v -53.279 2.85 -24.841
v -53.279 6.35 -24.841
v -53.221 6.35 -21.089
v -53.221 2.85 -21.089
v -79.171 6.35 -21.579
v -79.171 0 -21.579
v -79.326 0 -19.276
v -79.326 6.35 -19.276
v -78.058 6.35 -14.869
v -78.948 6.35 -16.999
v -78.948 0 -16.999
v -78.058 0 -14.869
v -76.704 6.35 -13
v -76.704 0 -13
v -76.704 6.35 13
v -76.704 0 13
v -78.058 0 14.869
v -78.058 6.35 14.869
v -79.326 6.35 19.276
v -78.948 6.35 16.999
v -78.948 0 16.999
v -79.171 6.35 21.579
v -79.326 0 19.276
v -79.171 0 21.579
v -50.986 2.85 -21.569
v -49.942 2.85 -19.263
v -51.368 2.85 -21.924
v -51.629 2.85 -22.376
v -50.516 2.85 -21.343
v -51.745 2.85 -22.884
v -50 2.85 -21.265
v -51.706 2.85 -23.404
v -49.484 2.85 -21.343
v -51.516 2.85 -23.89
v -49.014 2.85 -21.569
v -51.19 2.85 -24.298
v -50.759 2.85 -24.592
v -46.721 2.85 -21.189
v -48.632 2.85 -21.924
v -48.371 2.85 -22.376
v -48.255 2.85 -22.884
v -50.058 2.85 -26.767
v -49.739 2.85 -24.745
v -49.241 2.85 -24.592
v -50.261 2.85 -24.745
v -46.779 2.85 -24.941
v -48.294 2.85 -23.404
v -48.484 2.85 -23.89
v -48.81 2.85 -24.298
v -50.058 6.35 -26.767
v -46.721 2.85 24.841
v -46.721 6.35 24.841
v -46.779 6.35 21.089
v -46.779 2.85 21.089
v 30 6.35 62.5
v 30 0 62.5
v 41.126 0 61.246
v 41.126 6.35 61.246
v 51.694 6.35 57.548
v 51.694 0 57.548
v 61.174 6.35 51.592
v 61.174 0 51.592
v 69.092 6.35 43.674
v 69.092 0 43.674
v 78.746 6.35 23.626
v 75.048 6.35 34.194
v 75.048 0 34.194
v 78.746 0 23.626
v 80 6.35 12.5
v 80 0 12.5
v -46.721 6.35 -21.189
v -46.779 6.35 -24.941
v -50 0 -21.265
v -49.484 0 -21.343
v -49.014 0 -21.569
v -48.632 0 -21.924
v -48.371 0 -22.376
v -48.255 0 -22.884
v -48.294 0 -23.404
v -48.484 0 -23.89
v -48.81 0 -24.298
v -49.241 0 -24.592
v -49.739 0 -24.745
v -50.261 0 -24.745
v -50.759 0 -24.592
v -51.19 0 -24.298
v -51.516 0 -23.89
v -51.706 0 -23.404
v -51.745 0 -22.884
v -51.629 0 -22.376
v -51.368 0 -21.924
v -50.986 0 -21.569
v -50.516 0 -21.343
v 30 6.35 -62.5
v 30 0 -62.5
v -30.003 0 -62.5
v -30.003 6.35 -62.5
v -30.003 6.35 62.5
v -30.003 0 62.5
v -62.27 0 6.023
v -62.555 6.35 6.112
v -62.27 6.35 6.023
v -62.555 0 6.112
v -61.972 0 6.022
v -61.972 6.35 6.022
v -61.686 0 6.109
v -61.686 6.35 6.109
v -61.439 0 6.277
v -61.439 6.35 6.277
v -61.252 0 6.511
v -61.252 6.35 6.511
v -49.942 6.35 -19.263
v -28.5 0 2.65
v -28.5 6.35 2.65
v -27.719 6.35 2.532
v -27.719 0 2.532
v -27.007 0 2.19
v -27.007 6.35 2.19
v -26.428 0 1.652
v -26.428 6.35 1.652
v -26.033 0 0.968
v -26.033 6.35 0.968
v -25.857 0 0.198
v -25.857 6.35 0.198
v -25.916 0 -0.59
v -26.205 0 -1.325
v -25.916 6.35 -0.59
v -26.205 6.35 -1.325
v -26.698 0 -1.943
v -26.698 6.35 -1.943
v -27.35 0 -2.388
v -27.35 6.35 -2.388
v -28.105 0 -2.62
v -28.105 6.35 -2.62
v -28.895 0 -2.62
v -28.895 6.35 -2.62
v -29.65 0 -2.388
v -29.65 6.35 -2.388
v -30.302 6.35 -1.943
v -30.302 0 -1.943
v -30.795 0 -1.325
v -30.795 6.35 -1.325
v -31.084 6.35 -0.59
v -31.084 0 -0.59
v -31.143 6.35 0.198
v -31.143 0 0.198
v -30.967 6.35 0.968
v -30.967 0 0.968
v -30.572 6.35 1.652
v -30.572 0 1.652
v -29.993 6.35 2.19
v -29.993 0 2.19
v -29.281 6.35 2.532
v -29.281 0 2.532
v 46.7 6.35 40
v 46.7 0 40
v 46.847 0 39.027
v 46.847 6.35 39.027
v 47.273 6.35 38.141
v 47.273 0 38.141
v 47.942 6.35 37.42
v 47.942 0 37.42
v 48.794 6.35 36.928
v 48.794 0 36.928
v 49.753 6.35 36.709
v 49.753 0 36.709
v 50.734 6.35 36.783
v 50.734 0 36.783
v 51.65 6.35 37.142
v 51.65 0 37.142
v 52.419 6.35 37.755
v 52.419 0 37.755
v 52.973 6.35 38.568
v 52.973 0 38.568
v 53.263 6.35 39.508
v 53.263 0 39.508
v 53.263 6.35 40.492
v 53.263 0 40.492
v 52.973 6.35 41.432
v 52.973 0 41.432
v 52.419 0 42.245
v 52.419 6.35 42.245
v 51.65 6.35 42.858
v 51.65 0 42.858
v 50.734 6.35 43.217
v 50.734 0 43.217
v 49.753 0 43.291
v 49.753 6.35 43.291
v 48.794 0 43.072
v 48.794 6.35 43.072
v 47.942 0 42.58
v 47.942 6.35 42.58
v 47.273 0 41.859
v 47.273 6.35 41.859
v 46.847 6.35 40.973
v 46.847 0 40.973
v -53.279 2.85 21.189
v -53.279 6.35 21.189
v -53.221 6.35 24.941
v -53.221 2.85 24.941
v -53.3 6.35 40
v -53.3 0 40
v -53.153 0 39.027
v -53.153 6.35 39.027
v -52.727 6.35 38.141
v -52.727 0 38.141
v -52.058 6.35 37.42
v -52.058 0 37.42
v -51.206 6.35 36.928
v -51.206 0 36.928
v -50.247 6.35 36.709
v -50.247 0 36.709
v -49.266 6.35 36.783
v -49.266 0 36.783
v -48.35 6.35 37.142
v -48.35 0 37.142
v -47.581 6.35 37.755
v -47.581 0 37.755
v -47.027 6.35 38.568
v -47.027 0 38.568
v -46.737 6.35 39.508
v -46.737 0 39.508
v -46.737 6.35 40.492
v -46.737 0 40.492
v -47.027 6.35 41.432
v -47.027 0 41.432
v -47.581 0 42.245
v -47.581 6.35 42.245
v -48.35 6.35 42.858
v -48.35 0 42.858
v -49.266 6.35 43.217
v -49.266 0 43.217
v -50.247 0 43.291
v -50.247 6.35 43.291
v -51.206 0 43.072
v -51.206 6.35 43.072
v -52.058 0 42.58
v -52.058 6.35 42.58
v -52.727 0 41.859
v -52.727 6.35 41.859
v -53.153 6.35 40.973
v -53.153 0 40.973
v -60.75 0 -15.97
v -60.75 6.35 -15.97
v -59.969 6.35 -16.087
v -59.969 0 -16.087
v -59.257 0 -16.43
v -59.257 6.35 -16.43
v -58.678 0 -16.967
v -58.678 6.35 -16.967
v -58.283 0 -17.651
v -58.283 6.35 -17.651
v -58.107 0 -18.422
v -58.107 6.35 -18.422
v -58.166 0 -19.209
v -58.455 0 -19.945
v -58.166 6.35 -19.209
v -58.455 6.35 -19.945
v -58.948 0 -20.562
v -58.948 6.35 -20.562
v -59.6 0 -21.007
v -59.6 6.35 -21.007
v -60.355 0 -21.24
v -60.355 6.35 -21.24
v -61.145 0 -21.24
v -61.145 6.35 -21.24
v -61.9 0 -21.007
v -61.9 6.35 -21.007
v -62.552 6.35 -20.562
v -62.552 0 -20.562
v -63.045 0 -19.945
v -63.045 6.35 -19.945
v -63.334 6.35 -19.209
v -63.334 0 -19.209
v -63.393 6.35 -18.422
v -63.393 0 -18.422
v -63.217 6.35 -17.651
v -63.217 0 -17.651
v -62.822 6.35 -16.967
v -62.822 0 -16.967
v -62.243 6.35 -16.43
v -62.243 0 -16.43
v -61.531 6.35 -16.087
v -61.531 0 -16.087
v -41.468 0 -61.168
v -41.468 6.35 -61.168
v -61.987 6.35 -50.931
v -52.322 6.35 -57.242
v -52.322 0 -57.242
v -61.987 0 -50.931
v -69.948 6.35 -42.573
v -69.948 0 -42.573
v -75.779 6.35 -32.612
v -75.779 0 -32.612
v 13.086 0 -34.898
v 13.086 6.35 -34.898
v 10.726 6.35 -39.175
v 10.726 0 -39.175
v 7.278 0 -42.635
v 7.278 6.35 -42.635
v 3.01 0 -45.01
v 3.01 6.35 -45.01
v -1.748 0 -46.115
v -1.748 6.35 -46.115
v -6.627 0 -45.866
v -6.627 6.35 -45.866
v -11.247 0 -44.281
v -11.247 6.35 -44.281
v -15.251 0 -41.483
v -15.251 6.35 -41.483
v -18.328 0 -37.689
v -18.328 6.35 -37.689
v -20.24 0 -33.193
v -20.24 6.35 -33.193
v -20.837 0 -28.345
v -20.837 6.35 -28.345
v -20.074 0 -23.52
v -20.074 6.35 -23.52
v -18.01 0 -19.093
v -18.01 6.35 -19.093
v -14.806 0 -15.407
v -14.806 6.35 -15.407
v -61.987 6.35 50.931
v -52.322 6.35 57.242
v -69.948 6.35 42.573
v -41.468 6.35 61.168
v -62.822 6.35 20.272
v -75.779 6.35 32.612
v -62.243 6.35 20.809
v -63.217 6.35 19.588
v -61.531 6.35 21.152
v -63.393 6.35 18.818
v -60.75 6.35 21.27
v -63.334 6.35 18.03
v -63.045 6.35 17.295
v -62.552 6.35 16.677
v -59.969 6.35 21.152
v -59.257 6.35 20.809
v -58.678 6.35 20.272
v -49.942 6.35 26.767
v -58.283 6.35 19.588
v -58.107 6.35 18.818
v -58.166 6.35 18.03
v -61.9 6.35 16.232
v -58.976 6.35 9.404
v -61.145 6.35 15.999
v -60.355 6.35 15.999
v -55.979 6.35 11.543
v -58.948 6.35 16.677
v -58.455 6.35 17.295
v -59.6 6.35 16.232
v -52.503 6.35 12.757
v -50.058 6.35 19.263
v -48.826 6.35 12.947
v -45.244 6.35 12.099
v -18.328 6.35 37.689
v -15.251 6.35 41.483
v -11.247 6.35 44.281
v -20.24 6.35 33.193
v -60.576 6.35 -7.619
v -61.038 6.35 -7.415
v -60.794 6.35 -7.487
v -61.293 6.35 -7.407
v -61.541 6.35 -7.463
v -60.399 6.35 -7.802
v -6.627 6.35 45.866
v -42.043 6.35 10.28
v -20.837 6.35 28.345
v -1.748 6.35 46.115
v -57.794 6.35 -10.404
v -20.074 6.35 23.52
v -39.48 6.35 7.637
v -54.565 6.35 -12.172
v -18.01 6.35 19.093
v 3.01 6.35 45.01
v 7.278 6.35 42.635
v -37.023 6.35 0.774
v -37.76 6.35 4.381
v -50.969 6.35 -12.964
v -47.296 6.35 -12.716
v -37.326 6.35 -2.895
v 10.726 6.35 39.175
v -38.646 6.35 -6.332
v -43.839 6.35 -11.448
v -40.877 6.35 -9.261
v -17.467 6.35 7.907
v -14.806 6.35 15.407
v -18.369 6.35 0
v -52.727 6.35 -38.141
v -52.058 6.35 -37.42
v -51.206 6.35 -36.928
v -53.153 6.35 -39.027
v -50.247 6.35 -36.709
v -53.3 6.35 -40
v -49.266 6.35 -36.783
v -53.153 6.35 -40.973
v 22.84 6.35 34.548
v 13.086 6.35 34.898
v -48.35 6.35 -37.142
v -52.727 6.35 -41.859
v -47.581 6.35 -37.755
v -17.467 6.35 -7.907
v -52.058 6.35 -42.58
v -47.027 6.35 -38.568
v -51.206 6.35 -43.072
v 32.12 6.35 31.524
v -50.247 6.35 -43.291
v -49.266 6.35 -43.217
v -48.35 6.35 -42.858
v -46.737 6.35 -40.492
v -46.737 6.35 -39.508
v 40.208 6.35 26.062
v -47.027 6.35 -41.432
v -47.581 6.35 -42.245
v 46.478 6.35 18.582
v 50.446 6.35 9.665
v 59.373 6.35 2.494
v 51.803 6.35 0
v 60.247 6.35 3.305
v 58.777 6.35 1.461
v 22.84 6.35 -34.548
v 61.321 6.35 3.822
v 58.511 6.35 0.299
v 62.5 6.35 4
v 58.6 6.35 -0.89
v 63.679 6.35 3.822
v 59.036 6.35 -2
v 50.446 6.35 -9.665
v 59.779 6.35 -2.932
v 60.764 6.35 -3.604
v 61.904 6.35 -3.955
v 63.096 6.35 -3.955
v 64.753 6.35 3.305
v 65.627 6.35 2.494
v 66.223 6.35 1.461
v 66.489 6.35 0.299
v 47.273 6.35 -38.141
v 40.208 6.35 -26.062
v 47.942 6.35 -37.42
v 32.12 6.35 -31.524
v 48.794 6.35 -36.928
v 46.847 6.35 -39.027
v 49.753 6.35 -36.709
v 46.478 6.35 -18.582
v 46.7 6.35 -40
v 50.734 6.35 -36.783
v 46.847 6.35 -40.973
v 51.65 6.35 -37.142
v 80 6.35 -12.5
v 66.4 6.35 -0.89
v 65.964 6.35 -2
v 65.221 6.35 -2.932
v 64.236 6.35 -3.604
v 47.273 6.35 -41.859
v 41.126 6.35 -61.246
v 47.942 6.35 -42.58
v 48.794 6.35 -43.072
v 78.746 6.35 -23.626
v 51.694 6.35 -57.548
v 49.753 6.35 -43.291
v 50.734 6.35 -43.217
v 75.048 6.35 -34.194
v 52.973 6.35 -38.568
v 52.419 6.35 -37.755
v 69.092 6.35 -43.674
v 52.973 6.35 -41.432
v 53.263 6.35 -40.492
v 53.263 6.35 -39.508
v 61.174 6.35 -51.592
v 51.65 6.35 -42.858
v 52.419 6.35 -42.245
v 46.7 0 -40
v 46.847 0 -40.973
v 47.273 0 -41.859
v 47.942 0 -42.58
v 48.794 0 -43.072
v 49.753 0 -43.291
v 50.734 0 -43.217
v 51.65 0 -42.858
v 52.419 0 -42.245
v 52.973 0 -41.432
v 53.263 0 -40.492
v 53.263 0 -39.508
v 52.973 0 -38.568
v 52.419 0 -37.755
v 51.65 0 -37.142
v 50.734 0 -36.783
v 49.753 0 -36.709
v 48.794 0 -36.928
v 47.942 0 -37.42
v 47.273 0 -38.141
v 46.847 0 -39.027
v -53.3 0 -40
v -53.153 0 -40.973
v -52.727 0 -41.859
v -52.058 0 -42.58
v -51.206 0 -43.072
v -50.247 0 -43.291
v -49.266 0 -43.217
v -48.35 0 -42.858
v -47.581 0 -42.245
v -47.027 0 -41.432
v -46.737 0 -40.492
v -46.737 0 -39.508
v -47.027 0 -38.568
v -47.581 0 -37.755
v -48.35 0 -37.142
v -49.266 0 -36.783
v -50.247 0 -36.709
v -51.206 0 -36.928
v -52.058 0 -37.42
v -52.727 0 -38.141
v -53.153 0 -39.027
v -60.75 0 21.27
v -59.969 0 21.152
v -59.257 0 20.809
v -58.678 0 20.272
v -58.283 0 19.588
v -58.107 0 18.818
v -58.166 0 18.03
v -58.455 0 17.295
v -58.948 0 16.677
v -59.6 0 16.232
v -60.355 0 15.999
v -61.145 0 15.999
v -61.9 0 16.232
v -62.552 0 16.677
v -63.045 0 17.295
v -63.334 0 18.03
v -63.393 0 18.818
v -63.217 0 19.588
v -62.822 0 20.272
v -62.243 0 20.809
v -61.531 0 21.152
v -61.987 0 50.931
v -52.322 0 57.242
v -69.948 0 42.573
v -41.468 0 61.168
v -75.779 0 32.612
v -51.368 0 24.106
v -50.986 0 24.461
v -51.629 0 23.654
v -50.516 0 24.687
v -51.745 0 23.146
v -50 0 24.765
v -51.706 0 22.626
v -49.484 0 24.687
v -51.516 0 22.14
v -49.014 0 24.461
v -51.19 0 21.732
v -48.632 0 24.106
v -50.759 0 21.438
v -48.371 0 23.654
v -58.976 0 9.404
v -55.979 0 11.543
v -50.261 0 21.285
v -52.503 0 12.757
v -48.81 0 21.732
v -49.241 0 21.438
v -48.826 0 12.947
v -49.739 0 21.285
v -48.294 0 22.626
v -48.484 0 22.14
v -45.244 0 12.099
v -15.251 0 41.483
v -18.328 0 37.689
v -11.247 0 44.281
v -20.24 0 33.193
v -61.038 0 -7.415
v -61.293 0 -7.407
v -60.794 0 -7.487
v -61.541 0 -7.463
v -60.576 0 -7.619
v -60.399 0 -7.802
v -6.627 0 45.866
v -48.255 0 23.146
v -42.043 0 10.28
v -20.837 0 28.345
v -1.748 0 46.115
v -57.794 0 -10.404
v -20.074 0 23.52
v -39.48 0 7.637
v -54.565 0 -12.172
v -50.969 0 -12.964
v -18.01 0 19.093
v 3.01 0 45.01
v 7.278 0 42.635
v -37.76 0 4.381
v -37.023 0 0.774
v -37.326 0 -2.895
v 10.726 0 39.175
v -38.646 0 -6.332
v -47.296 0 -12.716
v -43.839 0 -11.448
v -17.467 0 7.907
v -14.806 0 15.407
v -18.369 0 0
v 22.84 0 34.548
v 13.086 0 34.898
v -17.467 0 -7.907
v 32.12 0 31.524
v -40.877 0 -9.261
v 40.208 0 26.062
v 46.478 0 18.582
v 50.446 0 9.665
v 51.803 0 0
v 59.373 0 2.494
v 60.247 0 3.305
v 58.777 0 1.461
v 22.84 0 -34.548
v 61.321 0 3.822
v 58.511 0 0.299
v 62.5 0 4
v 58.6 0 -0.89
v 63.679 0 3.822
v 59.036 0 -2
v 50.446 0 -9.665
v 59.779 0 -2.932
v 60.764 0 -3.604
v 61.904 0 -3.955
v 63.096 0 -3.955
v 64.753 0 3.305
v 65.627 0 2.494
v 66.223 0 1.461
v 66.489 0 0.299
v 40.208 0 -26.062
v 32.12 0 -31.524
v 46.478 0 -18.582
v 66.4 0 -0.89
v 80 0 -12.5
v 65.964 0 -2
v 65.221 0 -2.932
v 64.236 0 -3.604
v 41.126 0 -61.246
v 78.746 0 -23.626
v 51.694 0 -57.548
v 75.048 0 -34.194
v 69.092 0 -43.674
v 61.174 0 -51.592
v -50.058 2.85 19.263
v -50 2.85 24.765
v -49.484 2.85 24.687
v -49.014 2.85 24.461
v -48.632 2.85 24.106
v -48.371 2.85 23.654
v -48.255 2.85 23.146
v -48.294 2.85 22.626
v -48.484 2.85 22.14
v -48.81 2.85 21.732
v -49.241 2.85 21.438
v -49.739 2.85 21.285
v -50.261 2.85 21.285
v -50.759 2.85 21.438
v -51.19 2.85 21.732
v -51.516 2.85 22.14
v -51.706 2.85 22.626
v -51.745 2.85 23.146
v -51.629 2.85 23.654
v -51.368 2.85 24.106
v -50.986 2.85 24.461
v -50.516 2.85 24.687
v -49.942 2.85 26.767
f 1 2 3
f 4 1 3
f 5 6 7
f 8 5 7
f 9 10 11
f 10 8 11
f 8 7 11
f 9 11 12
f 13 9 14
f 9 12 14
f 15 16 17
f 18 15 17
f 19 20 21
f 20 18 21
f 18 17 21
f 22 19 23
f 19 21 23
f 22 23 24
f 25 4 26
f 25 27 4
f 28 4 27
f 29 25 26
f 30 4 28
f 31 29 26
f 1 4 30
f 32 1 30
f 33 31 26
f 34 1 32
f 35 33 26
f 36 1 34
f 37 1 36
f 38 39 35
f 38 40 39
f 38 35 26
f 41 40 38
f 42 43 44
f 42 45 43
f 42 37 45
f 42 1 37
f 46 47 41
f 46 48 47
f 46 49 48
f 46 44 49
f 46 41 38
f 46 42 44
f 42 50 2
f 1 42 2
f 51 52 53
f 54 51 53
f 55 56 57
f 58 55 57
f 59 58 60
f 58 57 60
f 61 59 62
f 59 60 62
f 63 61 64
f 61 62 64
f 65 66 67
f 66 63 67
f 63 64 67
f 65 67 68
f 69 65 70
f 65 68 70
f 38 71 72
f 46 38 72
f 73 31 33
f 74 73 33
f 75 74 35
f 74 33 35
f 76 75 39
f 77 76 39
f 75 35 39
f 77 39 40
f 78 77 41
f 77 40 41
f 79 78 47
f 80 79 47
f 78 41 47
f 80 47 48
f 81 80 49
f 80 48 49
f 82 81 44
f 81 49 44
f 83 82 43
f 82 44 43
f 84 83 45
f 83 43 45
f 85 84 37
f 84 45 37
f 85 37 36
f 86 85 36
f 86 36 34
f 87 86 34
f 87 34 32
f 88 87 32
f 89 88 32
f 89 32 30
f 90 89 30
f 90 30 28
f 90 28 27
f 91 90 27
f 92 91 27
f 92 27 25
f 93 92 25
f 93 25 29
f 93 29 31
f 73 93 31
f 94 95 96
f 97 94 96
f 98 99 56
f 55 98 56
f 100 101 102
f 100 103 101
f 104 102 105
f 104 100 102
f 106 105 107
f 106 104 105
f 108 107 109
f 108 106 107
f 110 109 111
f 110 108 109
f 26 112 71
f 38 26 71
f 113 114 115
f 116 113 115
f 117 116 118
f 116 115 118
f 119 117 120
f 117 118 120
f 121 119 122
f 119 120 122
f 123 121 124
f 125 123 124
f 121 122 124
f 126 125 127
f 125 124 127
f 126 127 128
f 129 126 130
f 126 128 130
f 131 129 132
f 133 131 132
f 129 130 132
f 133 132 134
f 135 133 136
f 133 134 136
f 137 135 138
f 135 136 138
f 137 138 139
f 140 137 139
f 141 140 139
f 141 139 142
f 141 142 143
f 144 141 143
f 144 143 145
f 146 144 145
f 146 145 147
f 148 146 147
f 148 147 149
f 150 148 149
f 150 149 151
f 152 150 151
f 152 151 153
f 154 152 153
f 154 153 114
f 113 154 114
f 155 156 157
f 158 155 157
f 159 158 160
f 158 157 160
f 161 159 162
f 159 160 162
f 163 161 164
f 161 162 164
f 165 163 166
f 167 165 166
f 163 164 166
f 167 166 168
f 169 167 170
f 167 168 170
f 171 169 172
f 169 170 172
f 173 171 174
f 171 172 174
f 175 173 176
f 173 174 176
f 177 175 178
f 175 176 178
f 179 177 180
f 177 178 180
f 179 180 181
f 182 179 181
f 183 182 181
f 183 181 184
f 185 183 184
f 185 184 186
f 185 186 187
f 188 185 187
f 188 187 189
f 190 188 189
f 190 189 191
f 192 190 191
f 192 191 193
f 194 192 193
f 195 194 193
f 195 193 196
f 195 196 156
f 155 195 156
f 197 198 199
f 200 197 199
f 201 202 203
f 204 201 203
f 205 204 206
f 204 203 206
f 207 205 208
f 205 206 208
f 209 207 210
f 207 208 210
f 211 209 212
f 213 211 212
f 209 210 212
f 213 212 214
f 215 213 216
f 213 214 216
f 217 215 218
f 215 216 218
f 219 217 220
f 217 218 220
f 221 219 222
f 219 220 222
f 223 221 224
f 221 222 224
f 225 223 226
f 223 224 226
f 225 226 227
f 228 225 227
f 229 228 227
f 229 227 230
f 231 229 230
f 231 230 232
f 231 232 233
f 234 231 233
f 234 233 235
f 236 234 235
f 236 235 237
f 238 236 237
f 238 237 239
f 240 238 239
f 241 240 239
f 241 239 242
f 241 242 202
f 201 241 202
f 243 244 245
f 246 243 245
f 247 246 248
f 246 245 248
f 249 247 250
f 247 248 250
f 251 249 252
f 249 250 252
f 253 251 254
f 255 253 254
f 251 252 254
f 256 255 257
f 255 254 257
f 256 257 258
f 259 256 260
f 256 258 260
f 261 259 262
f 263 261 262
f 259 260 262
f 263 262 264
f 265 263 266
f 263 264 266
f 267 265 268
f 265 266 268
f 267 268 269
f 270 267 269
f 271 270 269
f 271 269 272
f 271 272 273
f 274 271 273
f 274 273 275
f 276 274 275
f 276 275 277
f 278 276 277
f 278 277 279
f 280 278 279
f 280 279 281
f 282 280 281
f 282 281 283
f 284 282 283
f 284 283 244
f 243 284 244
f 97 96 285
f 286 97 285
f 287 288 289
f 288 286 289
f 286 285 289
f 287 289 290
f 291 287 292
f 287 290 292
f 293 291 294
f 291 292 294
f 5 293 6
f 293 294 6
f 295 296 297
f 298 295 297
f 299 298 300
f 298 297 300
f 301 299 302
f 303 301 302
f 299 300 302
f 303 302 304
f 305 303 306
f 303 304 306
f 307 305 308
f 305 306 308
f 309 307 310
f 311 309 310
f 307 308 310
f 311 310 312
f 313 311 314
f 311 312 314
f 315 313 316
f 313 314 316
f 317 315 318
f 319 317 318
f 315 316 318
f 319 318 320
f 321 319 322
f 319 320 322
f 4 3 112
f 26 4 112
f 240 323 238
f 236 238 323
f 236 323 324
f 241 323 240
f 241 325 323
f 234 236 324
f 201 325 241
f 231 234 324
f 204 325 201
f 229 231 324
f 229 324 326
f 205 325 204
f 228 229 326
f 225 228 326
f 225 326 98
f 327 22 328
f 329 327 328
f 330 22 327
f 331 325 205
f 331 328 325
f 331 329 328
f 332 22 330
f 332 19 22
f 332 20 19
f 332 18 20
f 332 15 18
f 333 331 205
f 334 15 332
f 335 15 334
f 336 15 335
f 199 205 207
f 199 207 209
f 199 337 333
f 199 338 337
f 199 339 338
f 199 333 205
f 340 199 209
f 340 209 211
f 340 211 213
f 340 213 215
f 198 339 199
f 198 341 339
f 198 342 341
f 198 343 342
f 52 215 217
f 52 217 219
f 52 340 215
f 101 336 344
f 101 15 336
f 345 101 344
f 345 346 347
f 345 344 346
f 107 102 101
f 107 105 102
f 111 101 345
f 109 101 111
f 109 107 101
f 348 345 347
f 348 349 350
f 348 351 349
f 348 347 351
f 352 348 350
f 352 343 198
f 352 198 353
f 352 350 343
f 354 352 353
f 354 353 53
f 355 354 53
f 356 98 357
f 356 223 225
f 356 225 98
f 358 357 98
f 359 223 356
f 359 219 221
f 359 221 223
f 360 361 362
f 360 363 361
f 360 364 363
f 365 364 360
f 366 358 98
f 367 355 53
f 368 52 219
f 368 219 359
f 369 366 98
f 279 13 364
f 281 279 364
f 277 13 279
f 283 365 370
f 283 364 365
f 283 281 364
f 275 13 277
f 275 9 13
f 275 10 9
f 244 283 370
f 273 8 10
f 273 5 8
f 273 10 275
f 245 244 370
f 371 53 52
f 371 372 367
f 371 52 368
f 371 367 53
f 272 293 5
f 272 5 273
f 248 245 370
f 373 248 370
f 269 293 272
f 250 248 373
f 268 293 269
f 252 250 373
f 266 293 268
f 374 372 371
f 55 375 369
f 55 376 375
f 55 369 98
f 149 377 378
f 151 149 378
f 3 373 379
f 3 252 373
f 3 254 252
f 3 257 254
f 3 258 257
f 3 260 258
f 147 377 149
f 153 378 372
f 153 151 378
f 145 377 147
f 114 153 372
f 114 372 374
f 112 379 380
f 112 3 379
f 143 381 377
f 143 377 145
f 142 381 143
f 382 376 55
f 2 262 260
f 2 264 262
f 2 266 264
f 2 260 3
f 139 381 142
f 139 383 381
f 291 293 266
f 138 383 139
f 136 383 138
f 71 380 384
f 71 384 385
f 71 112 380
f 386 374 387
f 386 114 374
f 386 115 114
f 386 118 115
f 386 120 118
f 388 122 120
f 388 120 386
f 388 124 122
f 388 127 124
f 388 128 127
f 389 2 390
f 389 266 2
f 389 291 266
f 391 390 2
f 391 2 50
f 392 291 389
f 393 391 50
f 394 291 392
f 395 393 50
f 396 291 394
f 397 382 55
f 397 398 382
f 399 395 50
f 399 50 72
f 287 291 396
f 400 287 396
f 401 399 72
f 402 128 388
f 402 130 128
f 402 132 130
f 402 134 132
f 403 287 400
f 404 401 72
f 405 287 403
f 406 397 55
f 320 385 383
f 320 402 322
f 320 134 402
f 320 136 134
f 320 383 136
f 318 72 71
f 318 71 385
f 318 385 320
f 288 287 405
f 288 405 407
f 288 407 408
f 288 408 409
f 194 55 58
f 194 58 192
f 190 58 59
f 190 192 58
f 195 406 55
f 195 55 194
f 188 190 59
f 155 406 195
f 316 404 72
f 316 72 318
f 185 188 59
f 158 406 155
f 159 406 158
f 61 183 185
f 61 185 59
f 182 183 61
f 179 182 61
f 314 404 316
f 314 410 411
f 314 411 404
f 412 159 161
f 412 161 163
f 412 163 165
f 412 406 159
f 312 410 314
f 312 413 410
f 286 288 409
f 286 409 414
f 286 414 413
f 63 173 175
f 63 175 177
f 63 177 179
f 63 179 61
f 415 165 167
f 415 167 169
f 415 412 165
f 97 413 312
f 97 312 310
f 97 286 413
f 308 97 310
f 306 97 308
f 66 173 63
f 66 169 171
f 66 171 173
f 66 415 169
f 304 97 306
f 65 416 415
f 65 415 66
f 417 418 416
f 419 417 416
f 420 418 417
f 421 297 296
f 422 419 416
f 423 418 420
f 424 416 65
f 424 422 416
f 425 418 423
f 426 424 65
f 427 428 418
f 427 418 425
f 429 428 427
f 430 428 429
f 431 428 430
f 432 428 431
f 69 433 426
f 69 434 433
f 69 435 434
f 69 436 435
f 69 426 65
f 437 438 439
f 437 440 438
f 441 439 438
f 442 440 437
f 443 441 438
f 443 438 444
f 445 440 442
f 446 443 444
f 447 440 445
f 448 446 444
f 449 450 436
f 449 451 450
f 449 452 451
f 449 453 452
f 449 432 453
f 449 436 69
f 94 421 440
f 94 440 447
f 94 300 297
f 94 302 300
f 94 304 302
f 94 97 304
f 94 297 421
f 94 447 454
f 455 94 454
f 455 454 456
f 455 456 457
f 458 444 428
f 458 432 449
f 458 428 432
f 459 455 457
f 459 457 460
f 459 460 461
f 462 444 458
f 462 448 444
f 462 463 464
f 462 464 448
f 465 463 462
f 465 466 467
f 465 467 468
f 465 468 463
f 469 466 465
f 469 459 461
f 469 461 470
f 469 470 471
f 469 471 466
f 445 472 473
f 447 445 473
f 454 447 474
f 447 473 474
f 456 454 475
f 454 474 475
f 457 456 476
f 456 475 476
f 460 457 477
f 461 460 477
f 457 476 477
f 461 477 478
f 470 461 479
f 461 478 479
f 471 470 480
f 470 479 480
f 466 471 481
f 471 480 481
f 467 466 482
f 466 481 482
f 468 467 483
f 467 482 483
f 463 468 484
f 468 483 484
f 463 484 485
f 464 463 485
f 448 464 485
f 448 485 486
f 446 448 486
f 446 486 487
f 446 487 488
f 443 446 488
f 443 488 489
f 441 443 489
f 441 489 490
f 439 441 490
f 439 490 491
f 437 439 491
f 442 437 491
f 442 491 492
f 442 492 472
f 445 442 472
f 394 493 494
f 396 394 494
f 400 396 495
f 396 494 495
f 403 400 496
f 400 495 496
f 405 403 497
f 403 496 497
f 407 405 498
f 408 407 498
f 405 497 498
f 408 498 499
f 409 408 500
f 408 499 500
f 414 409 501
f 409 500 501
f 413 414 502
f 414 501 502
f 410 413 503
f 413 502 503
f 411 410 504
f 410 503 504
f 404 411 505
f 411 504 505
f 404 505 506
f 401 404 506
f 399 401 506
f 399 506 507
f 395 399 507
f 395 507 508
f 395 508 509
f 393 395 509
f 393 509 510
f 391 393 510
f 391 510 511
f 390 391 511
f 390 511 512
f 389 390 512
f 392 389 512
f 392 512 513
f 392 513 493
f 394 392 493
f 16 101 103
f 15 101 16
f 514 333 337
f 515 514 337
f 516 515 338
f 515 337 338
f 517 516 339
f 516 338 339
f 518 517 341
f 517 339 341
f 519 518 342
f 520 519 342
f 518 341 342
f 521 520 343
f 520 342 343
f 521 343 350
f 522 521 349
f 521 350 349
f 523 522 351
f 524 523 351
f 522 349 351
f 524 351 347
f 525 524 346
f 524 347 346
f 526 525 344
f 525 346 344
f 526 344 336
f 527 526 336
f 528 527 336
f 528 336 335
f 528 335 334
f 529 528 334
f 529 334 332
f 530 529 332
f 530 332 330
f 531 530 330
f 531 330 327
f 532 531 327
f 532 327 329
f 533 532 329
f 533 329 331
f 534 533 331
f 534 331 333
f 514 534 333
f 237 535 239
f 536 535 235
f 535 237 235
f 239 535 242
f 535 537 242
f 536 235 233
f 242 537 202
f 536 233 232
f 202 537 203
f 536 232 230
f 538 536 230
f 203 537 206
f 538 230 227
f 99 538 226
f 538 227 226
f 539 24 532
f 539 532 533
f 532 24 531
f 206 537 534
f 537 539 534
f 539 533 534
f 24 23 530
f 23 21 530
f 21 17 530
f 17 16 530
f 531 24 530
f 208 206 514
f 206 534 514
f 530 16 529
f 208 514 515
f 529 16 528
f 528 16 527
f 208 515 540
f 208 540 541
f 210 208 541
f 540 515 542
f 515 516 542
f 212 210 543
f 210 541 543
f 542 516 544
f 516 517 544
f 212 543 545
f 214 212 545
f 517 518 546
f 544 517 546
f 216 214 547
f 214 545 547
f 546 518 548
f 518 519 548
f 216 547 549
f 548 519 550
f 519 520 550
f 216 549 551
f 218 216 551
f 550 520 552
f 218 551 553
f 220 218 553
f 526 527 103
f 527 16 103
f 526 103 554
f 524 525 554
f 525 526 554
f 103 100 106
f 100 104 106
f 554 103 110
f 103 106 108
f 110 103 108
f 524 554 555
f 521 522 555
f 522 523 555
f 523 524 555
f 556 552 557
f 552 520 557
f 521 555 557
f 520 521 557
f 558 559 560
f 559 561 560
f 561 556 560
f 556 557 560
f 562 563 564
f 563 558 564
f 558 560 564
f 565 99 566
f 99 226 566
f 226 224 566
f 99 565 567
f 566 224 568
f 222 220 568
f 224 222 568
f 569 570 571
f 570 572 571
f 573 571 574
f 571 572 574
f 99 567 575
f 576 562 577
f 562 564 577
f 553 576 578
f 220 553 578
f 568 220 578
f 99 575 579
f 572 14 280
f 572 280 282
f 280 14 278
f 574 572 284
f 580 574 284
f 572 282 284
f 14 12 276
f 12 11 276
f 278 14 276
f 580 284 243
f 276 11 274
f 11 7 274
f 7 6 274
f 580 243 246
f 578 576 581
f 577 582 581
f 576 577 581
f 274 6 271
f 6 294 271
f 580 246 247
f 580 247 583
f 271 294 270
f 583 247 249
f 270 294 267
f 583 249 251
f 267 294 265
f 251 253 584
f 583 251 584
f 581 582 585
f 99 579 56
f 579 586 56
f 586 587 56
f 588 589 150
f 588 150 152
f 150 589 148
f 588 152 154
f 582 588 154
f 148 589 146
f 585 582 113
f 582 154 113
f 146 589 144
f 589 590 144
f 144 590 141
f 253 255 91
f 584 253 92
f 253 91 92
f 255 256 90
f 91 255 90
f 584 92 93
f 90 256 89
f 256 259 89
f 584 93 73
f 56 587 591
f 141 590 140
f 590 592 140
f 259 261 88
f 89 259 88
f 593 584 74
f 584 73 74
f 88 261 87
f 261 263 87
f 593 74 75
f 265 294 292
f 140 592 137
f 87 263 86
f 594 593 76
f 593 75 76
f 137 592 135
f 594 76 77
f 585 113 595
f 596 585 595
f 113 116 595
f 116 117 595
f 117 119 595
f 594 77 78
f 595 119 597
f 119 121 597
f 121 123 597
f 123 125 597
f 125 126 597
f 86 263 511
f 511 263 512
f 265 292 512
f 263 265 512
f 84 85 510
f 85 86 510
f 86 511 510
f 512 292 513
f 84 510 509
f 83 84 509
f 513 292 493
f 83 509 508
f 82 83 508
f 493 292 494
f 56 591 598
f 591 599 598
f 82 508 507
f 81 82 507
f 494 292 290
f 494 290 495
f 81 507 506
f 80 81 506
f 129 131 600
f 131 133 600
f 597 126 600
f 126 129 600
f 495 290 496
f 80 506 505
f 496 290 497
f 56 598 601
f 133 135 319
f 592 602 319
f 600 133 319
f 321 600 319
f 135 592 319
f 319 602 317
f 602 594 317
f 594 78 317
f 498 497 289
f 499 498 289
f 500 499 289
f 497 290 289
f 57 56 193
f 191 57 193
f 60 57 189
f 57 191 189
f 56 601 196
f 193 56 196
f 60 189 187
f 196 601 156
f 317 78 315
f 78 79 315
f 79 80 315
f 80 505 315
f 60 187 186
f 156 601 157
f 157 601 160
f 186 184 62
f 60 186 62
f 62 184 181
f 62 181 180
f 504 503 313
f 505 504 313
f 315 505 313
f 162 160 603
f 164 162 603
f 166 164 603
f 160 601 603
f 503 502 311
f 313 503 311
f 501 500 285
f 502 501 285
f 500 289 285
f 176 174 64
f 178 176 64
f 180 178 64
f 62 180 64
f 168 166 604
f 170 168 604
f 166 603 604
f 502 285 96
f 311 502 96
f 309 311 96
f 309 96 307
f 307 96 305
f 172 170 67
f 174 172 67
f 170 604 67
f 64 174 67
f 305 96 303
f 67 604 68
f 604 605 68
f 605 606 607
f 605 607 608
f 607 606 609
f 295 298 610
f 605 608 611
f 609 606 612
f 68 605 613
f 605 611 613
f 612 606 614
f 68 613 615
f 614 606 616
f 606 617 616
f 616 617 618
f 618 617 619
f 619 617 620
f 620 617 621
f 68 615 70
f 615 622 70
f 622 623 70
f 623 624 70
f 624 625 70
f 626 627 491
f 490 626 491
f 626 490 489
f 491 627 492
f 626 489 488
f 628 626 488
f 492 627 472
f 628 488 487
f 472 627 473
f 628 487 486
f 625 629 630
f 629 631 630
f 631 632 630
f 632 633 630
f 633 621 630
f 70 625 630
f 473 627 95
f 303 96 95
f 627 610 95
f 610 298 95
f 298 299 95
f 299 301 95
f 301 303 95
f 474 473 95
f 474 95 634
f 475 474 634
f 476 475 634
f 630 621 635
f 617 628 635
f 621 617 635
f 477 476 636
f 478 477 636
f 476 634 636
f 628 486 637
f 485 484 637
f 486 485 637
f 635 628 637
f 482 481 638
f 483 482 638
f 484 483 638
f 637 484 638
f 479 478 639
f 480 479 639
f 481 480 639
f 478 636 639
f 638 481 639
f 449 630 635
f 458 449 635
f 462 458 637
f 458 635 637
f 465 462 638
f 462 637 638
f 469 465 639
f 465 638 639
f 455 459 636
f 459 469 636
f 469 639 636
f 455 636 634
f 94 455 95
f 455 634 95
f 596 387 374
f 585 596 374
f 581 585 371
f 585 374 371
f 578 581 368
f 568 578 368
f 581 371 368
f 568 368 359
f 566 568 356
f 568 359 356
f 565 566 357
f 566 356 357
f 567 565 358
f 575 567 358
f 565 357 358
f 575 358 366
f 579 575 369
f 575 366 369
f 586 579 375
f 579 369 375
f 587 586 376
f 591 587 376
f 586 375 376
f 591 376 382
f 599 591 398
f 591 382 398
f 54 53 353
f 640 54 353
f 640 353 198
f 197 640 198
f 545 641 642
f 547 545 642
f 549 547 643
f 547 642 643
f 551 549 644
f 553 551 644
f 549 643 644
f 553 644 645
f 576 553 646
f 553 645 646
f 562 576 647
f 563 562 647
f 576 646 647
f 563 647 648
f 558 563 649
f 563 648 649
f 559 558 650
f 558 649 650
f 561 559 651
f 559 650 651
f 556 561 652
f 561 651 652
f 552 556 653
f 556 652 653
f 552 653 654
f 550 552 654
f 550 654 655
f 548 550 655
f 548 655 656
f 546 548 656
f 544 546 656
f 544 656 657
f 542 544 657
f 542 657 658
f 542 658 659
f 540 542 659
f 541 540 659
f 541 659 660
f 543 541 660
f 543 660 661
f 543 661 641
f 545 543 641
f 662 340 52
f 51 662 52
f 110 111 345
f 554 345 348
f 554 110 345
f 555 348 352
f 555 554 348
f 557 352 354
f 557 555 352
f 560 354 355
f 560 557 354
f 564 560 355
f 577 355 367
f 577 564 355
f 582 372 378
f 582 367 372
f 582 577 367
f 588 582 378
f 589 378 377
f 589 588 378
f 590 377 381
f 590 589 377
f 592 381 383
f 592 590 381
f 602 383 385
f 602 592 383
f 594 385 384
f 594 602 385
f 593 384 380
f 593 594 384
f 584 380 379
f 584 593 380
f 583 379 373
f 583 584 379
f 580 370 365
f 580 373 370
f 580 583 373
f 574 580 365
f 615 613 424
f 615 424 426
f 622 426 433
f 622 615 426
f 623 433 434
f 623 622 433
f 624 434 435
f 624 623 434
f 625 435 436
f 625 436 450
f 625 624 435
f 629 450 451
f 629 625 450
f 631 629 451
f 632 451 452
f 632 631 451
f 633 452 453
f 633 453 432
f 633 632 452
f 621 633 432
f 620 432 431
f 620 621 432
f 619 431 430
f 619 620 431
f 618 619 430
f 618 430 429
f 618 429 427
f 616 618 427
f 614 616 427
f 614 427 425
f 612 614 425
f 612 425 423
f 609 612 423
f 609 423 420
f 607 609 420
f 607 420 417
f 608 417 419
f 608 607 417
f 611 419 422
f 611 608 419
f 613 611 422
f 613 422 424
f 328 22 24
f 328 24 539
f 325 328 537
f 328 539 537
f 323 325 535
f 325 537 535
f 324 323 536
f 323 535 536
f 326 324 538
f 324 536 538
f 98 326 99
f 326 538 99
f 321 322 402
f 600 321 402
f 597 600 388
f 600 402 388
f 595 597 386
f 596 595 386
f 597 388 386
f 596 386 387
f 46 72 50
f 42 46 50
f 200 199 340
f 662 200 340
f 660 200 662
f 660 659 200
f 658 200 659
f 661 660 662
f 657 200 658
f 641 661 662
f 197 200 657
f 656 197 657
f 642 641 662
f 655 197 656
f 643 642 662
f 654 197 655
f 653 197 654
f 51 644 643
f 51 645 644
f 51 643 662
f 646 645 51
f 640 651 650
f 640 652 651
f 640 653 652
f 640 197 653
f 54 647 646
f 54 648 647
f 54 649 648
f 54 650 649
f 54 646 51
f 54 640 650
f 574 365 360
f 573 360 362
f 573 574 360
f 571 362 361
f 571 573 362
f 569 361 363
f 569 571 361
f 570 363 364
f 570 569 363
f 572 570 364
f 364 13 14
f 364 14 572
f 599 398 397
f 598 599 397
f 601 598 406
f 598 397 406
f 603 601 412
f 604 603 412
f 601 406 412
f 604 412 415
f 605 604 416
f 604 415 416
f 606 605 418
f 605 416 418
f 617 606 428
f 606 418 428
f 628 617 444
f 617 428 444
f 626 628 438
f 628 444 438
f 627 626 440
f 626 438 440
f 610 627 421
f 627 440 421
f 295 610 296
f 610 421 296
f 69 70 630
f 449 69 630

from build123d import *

# Parameters (mm, degrees)
SKETCH2_R                = 13
SKETCH2_R_2              = 4
BOSS_EXTRUDE1_DEPTH      = 6.35
FILLET1_R                = 50
M6_CLEARANCE_HOLE1_D     = 6.6
M6_CLEARANCE_HOLE1_DEPTH = 15
M6_CLEARANCE_HOLE1_TIP   = 1.982840043
FILLET2_R                = 10
CUT_EXTRUDE1_REACH       = 103.718
SKETCH5_R                = 2.65
SKETCH5_R_2              = 1.75
CUT_EXTRUDE2_DEPTH       = 3.5
CUT_EXTRUDE3_REACH       = 103.718
FILLET3_R                = 1
CUT_EXTRUDE4_REACH       = 103.718


with BuildPart() as part:
    # Sketch2 → Boss-Extrude1 (new body)
    with BuildSketch(Plane(origin=(0, 0, 0), x_dir=(1, 0, 0), z_dir=(0, 1, 0))):
        with BuildLine():
            ThreePointArc((-76.703745056, 13), (-79.7, 0), (-76.703745056, -13))
            Line((-76.703745056, -13), (-80, -13))
            Line((-80, -13), (-80, -62.5))
            Line((-80, -62.5), (80, -62.5))
            Line((80, -62.5), (80, 62.5))
            Line((80, 62.5), (-80, 62.5))
            Line((-80, 62.5), (-80, 13))
            Line((-80, 13), (-76.703745056, 13))
        make_face()
        with Locations(Location((-50, 0, 0), (0, 0, 270))):
            Circle(SKETCH2_R, mode=Mode.SUBTRACT)
        with Locations(Location((62.5, 0, 0), (0, 0, 270))):
            Circle(SKETCH2_R_2, mode=Mode.SUBTRACT)
    extrude(amount=BOSS_EXTRUDE1_DEPTH)

    # Fillet1
    # the kernel refuses this fillet: 50 mm, written as the material it takes off along each edge
    with BuildSketch(Plane(origin=(80, -125, 62.5), x_dir=(-1, 0, 0), z_dir=(0, 1, 0)), Plane(origin=(80, -125, -62.5), x_dir=(0, 0, 1), z_dir=(0, 1, 0))) as fillet1_piece_1:
        with BuildLine():
            CenterArc((FILLET1_R, -FILLET1_R), FILLET1_R, 90, 90)
            Line((0, -FILLET1_R), (-FILLET1_R * 0.02, -FILLET1_R))
            Line((-FILLET1_R * 0.02, -FILLET1_R), (-FILLET1_R * 0.02, FILLET1_R * 0.02))
            Line((-FILLET1_R * 0.02, FILLET1_R * 0.02), (FILLET1_R, FILLET1_R * 0.02))
            Line((FILLET1_R, FILLET1_R * 0.02), (FILLET1_R, 0))
        make_face()
    extrude(amount=256.35, mode=Mode.SUBTRACT)
    with BuildSketch(Plane(origin=(-80, -124.993749844, -62.5), x_dir=(1, 0, 0), z_dir=(0, 1, 0))) as fillet1_piece_2:
        with BuildLine():
            CenterArc((49.997499938, -50), FILLET1_R, 90, 89.427032655)
            Line((0, -49.5), (-0.999949999, -49.49))
            ThreePointArc((-0.999949999, -49.49), (-1, -24.75), (-1, 0))
            Line((-1, 0), (0, 1))
            Line((0, 1), (49.997499938, 1))
            Line((49.997499938, 1), (49.997499938, 0))
        make_face()
    extrude(amount=256.337499688, mode=Mode.SUBTRACT)
    with BuildSketch(Plane(origin=(-80, -124.993749844, 62.5), x_dir=(0, 0, -1), z_dir=(0, 1, 0))) as fillet1_piece_3:
        with BuildLine():
            CenterArc((50, -49.997499937), FILLET1_R, 90.572967345, 89.427032655)
            Line((0, -49.997499938), (-1, -49.997499938))
            Line((-1, -49.997499938), (-1, 0))
            Line((-1, 0), (0, 1))
            ThreePointArc((0, 1), (24.75, 1), (49.49, 0.999949999))
            Line((49.49, 0.999949999), (49.5, 0))
        make_face()
    extrude(amount=256.337499688, mode=Mode.SUBTRACT)

    # M6 Clearance Hole1
    with Locations(Plane(origin=(0, 6.35, 0), x_dir=(1, 0, 0), z_dir=(0, 1, 0))):
        with Locations((50, 40), (-50, -40), (-50, 40), (50, -40)):
            Hole(M6_CLEARANCE_HOLE1_D / 2, depth=M6_CLEARANCE_HOLE1_DEPTH)
            with Locations((0, 0, -(M6_CLEARANCE_HOLE1_DEPTH + M6_CLEARANCE_HOLE1_TIP / 2))):  # 118° drill point
                Cone(0, M6_CLEARANCE_HOLE1_D / 2, M6_CLEARANCE_HOLE1_TIP, mode=Mode.SUBTRACT)

    # Fillet2
    # the kernel refuses this fillet: 10 mm, written as the material it takes off along each edge
    with BuildSketch(Plane(origin=(-80, -21.546986926, 13), x_dir=(1, 0, 0), z_dir=(0, 1, 0))) as fillet2_piece_1:
        with BuildLine():
            CenterArc((10.662433046, -6.7630925), FILLET2_R, 137.444096304, 53.017550986)
            Line((0.828666324, -8.578865625), (0.631990989, -8.615181088))
            ThreePointArc((0.631990989, -8.615181088), (0.030066454, -4.326550643), (-0.19999, -0.002))
            Line((-0.19999, -0.002), (0, 0.2))
            ThreePointArc((0, 0.2), (1.648127472, 0.2), (3.148931382, 0.13526185))
            Line((3.148931382, 0.13526185), (3.296254944, 0))
        make_face()
    extrude(amount=49.443973852, mode=Mode.SUBTRACT)
    with BuildSketch(Plane(origin=(-80, -21.546986926, -13), x_dir=(1, 0, 0), z_dir=(0, 1, 0))) as fillet2_piece_2:
        with BuildLine():
            CenterArc((10.662433046, 6.7630925), FILLET2_R, 169.538352709, 53.017550986)
            Line((0.828666324, 8.578865625), (0.631990989, 8.615181088))
            ThreePointArc((0.631990989, 8.615181088), (0.030066454, 4.326550643), (-0.19999, 0.002))
            Line((-0.19999, 0.002), (0, -0.2))
            ThreePointArc((0, -0.2), (1.648127472, -0.2), (3.148931382, -0.13526185))
            Line((3.148931382, -0.13526185), (3.296254944, 0))
        make_face()
    extrude(amount=49.443973852, mode=Mode.SUBTRACT)

    # Sketch5 → Cut-Extrude1 (cut, up to next)
    with BuildSketch(Plane(origin=(0, 6.35, 0), x_dir=(1, 0, 0), z_dir=(0, 1, 0)), mode=Mode.PRIVATE) as cut_extrude1_sk1:
        with Locations(Location((-28.5, 0, 0), (0, 0, 270))):
            Circle(SKETCH5_R)
    cut_extrude1_tool1 = extrude(cut_extrude1_sk1.sketch, amount=-CUT_EXTRUDE1_REACH, mode=Mode.PRIVATE) & part.part
    # Sketch5 → Cut-Extrude1 (cut, up to next)
    with BuildSketch(Plane(origin=(0, 6.35, 0), x_dir=(1, 0, 0), z_dir=(0, 1, 0)), mode=Mode.PRIVATE) as cut_extrude1_sk2:
        with Locations(Location((-60.75, -18.619546181, 0), (0, 0, 270))):
            Circle(SKETCH5_R)
    cut_extrude1_tool2 = extrude(cut_extrude1_sk2.sketch, amount=-CUT_EXTRUDE1_REACH, mode=Mode.PRIVATE) & part.part
    # Sketch5 → Cut-Extrude1 (cut, up to next)
    with BuildSketch(Plane(origin=(0, 6.35, 0), x_dir=(1, 0, 0), z_dir=(0, 1, 0)), mode=Mode.PRIVATE) as cut_extrude1_sk3:
        with Locations(Location((-60.75, 18.619546181, 0), (0, 0, 270))):
            Circle(SKETCH5_R)
    cut_extrude1_tool3 = extrude(cut_extrude1_sk3.sketch, amount=-CUT_EXTRUDE1_REACH, mode=Mode.PRIVATE) & part.part
    # Sketch5 → Cut-Extrude1 (cut, up to next)
    with BuildSketch(Plane(origin=(0, 6.35, 0), x_dir=(1, 0, 0), z_dir=(0, 1, 0)), mode=Mode.PRIVATE) as cut_extrude1_sk4:
        with Locations(Location((-50, 23.015, 0), (0, 0, 270))):
            Circle(SKETCH5_R_2)
    cut_extrude1_tool4 = extrude(cut_extrude1_sk4.sketch, amount=-CUT_EXTRUDE1_REACH, mode=Mode.PRIVATE) & part.part
    # Sketch5 → Cut-Extrude1 (cut, up to next)
    with BuildSketch(Plane(origin=(0, 6.35, 0), x_dir=(1, 0, 0), z_dir=(0, 1, 0)), mode=Mode.PRIVATE) as cut_extrude1_sk5:
        with Locations(Location((-50, -23.015, 0), (0, 0, 270))):
            Circle(SKETCH5_R_2)
    cut_extrude1_tool5 = extrude(cut_extrude1_sk5.sketch, amount=-CUT_EXTRUDE1_REACH, mode=Mode.PRIVATE) & part.part
    add(cut_extrude1_tool1.solids().sort_by_distance((-28.5, 6.35, 0))[0], mode=Mode.SUBTRACT)
    add(cut_extrude1_tool2.solids().sort_by_distance((-60.75, 6.35, 18.619546))[0], mode=Mode.SUBTRACT)
    add(cut_extrude1_tool3.solids().sort_by_distance((-60.75, 6.35, -18.619546))[0], mode=Mode.SUBTRACT)
    add(cut_extrude1_tool4.solids().sort_by_distance((-50, 6.35, -23.015))[0], mode=Mode.SUBTRACT)
    add(cut_extrude1_tool5.solids().sort_by_distance((-50, 6.35, 23.015))[0], mode=Mode.SUBTRACT)

    # Sketch6 → Cut-Extrude2 (cut)
    with BuildSketch(Plane(origin=(0, 6.35, 0), x_dir=(1, 0, 0), z_dir=(0, 1, 0))):
        Polygon((-53.220697552, -24.941250403), (-49.942166993, -26.767331099), (-46.721469441, -24.841080696), (-46.779302448, -21.088749597), (-50.057833007, -19.262668901), (-53.278530559, -21.188919304), align=None)
        Polygon((-46.779302448, 24.941250403), (-50.057833007, 26.767331099), (-53.278530559, 24.841080696), (-53.220697552, 21.088749597), (-49.942166993, 19.262668901), (-46.721469441, 21.188919304), align=None)
    extrude(amount=-CUT_EXTRUDE2_DEPTH, mode=Mode.SUBTRACT)

    # Sketch7 → Cut-Extrude3 (cut, up to next)
    with BuildSketch(Plane(origin=(0, 6.35, 0), x_dir=(1, 0, 0), z_dir=(0, 1, 0)), mode=Mode.PRIVATE) as cut_extrude3_sk1:
        with BuildLine():
            Line((-76.703745056, 13), (-60.823662152, 7.200578978))
            ThreePointArc((-60.823662152, 7.200578978), (-62.970841385, 0.870214783), (-61.688507937, -5.69023569))
            Line((-61.688507937, -5.69023569), (-76.703745056, -13))
            ThreePointArc((-76.703745056, -13), (-79.7, 0), (-76.703745056, 13))
        make_face()
    cut_extrude3_tool1 = extrude(cut_extrude3_sk1.sketch, amount=-CUT_EXTRUDE3_REACH, mode=Mode.PRIVATE) & part.part
    add(cut_extrude3_tool1.solids().sort_by_distance((-71.4533, 6.35, -0.3701))[0], mode=Mode.SUBTRACT)

    # Fillet3
    fillet3_edges = [part.edges().sort_by_distance(p)[0] for p in [
        (-60.823662152, 3.175, -7.200578978),
        (-61.688507937, 3.175, 5.69023569),
    ]]
    fillet(fillet3_edges, radius=FILLET3_R)

    # Sketch8 → Cut-Extrude4 (cut, up to next)
    with BuildSketch(Plane(origin=(0, 6.35, 0), x_dir=(1, 0, 0), z_dir=(0, 1, 0)), mode=Mode.PRIVATE) as cut_extrude4_sk1:
        with BuildLine():
            ThreePointArc((13.086188506, -34.897759169), (51.803145873, 0), (13.086188506, 34.897759169))
            ThreePointArc((13.086188506, 34.897759169), (-13.347108623, 43.021646829), (-14.805555972, 15.406620499))
            ThreePointArc((-14.805555972, 15.406620499), (-18.369113715, 0), (-14.805555972, -15.406620499))
            ThreePointArc((-14.805555972, -15.406620499), (-13.347108623, -43.021646829), (13.086188506, -34.897759169))
        make_face()
    cut_extrude4_tool1 = extrude(cut_extrude4_sk1.sketch, amount=-CUT_EXTRUDE4_REACH, mode=Mode.PRIVATE) & part.part
    add(cut_extrude4_tool1.solids().sort_by_distance((11.588613, 6.35, 0))[0], mode=Mode.SUBTRACT)


solid = part.part
